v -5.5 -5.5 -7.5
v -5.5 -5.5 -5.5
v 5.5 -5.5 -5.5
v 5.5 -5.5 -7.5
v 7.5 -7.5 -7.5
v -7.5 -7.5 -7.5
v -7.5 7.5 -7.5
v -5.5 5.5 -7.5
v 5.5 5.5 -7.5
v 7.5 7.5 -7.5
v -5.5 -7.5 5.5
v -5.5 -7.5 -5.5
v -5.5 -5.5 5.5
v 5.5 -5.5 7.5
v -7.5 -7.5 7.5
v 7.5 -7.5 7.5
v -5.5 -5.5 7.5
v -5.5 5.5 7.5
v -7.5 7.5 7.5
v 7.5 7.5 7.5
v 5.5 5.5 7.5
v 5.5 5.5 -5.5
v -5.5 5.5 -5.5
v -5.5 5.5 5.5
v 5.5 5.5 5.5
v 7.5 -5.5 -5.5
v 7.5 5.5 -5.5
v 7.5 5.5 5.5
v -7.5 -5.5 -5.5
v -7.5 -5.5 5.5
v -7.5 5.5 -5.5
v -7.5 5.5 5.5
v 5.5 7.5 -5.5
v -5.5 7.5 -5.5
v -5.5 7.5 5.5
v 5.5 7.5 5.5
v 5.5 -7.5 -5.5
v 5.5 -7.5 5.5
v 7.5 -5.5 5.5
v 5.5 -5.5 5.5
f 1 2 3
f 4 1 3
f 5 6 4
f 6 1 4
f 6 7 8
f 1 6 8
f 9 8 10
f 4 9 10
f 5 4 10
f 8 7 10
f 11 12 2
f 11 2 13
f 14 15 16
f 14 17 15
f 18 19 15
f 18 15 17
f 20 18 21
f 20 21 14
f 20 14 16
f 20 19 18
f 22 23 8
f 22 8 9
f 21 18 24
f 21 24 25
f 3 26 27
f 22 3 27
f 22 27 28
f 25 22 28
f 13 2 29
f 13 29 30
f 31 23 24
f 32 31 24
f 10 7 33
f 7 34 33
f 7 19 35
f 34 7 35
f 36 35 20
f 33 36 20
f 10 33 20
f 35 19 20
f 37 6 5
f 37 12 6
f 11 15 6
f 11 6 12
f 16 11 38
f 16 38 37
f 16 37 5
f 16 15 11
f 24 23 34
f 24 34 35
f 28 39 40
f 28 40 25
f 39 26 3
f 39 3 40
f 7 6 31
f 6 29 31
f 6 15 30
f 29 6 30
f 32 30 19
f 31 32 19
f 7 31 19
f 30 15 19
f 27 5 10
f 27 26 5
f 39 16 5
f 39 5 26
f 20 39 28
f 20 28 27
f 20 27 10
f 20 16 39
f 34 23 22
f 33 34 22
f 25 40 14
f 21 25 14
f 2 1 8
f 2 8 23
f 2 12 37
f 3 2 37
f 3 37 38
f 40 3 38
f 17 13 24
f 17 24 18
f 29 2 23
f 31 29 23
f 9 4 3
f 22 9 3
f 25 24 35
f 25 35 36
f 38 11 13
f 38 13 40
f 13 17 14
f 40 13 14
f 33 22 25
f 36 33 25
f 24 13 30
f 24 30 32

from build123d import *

# Parameters (mm, degrees)
F0_W          = 15
F0_H          = 15
F0_W_2        = 11
F0_H_2        = 11
F1_DEPTH      = 7.5
F1_DEPTH_BACK = 7.5
F2_W          = 11
F2_H          = 11
F3_DEPTH      = 25
F4_W          = 11
F4_H          = 11
F5_DEPTH      = 15.001


# Not quite as in the source:
# - the program builds the solid bodies; features that only make, move or delete a surface that nothing else refers to are left out


with BuildPart() as f1:
    # F0 (on Top) → F1 (new body, two sides)
    with BuildSketch(Plane.XY) as f1_sk:
        Rectangle(F0_W, F0_H)
        Rectangle(F0_W_2, F0_H_2, mode=Mode.SUBTRACT)
    extrude(amount=F1_DEPTH)
    extrude(f1_sk.sketch, amount=-F1_DEPTH_BACK)

    # F2 (on face) → F3 (cut)
    with BuildSketch(Plane.XZ.offset(7.5)):
        Rectangle(F2_W, F2_H)
    extrude(amount=-F3_DEPTH, mode=Mode.SUBTRACT)

    # F4 (on face) → F5 (cut, through all)
    with BuildSketch(Plane.YZ.offset(7.5)):
        Rectangle(F4_W, F4_H)
    extrude(amount=-F5_DEPTH, mode=Mode.SUBTRACT)


solid = f1.part
